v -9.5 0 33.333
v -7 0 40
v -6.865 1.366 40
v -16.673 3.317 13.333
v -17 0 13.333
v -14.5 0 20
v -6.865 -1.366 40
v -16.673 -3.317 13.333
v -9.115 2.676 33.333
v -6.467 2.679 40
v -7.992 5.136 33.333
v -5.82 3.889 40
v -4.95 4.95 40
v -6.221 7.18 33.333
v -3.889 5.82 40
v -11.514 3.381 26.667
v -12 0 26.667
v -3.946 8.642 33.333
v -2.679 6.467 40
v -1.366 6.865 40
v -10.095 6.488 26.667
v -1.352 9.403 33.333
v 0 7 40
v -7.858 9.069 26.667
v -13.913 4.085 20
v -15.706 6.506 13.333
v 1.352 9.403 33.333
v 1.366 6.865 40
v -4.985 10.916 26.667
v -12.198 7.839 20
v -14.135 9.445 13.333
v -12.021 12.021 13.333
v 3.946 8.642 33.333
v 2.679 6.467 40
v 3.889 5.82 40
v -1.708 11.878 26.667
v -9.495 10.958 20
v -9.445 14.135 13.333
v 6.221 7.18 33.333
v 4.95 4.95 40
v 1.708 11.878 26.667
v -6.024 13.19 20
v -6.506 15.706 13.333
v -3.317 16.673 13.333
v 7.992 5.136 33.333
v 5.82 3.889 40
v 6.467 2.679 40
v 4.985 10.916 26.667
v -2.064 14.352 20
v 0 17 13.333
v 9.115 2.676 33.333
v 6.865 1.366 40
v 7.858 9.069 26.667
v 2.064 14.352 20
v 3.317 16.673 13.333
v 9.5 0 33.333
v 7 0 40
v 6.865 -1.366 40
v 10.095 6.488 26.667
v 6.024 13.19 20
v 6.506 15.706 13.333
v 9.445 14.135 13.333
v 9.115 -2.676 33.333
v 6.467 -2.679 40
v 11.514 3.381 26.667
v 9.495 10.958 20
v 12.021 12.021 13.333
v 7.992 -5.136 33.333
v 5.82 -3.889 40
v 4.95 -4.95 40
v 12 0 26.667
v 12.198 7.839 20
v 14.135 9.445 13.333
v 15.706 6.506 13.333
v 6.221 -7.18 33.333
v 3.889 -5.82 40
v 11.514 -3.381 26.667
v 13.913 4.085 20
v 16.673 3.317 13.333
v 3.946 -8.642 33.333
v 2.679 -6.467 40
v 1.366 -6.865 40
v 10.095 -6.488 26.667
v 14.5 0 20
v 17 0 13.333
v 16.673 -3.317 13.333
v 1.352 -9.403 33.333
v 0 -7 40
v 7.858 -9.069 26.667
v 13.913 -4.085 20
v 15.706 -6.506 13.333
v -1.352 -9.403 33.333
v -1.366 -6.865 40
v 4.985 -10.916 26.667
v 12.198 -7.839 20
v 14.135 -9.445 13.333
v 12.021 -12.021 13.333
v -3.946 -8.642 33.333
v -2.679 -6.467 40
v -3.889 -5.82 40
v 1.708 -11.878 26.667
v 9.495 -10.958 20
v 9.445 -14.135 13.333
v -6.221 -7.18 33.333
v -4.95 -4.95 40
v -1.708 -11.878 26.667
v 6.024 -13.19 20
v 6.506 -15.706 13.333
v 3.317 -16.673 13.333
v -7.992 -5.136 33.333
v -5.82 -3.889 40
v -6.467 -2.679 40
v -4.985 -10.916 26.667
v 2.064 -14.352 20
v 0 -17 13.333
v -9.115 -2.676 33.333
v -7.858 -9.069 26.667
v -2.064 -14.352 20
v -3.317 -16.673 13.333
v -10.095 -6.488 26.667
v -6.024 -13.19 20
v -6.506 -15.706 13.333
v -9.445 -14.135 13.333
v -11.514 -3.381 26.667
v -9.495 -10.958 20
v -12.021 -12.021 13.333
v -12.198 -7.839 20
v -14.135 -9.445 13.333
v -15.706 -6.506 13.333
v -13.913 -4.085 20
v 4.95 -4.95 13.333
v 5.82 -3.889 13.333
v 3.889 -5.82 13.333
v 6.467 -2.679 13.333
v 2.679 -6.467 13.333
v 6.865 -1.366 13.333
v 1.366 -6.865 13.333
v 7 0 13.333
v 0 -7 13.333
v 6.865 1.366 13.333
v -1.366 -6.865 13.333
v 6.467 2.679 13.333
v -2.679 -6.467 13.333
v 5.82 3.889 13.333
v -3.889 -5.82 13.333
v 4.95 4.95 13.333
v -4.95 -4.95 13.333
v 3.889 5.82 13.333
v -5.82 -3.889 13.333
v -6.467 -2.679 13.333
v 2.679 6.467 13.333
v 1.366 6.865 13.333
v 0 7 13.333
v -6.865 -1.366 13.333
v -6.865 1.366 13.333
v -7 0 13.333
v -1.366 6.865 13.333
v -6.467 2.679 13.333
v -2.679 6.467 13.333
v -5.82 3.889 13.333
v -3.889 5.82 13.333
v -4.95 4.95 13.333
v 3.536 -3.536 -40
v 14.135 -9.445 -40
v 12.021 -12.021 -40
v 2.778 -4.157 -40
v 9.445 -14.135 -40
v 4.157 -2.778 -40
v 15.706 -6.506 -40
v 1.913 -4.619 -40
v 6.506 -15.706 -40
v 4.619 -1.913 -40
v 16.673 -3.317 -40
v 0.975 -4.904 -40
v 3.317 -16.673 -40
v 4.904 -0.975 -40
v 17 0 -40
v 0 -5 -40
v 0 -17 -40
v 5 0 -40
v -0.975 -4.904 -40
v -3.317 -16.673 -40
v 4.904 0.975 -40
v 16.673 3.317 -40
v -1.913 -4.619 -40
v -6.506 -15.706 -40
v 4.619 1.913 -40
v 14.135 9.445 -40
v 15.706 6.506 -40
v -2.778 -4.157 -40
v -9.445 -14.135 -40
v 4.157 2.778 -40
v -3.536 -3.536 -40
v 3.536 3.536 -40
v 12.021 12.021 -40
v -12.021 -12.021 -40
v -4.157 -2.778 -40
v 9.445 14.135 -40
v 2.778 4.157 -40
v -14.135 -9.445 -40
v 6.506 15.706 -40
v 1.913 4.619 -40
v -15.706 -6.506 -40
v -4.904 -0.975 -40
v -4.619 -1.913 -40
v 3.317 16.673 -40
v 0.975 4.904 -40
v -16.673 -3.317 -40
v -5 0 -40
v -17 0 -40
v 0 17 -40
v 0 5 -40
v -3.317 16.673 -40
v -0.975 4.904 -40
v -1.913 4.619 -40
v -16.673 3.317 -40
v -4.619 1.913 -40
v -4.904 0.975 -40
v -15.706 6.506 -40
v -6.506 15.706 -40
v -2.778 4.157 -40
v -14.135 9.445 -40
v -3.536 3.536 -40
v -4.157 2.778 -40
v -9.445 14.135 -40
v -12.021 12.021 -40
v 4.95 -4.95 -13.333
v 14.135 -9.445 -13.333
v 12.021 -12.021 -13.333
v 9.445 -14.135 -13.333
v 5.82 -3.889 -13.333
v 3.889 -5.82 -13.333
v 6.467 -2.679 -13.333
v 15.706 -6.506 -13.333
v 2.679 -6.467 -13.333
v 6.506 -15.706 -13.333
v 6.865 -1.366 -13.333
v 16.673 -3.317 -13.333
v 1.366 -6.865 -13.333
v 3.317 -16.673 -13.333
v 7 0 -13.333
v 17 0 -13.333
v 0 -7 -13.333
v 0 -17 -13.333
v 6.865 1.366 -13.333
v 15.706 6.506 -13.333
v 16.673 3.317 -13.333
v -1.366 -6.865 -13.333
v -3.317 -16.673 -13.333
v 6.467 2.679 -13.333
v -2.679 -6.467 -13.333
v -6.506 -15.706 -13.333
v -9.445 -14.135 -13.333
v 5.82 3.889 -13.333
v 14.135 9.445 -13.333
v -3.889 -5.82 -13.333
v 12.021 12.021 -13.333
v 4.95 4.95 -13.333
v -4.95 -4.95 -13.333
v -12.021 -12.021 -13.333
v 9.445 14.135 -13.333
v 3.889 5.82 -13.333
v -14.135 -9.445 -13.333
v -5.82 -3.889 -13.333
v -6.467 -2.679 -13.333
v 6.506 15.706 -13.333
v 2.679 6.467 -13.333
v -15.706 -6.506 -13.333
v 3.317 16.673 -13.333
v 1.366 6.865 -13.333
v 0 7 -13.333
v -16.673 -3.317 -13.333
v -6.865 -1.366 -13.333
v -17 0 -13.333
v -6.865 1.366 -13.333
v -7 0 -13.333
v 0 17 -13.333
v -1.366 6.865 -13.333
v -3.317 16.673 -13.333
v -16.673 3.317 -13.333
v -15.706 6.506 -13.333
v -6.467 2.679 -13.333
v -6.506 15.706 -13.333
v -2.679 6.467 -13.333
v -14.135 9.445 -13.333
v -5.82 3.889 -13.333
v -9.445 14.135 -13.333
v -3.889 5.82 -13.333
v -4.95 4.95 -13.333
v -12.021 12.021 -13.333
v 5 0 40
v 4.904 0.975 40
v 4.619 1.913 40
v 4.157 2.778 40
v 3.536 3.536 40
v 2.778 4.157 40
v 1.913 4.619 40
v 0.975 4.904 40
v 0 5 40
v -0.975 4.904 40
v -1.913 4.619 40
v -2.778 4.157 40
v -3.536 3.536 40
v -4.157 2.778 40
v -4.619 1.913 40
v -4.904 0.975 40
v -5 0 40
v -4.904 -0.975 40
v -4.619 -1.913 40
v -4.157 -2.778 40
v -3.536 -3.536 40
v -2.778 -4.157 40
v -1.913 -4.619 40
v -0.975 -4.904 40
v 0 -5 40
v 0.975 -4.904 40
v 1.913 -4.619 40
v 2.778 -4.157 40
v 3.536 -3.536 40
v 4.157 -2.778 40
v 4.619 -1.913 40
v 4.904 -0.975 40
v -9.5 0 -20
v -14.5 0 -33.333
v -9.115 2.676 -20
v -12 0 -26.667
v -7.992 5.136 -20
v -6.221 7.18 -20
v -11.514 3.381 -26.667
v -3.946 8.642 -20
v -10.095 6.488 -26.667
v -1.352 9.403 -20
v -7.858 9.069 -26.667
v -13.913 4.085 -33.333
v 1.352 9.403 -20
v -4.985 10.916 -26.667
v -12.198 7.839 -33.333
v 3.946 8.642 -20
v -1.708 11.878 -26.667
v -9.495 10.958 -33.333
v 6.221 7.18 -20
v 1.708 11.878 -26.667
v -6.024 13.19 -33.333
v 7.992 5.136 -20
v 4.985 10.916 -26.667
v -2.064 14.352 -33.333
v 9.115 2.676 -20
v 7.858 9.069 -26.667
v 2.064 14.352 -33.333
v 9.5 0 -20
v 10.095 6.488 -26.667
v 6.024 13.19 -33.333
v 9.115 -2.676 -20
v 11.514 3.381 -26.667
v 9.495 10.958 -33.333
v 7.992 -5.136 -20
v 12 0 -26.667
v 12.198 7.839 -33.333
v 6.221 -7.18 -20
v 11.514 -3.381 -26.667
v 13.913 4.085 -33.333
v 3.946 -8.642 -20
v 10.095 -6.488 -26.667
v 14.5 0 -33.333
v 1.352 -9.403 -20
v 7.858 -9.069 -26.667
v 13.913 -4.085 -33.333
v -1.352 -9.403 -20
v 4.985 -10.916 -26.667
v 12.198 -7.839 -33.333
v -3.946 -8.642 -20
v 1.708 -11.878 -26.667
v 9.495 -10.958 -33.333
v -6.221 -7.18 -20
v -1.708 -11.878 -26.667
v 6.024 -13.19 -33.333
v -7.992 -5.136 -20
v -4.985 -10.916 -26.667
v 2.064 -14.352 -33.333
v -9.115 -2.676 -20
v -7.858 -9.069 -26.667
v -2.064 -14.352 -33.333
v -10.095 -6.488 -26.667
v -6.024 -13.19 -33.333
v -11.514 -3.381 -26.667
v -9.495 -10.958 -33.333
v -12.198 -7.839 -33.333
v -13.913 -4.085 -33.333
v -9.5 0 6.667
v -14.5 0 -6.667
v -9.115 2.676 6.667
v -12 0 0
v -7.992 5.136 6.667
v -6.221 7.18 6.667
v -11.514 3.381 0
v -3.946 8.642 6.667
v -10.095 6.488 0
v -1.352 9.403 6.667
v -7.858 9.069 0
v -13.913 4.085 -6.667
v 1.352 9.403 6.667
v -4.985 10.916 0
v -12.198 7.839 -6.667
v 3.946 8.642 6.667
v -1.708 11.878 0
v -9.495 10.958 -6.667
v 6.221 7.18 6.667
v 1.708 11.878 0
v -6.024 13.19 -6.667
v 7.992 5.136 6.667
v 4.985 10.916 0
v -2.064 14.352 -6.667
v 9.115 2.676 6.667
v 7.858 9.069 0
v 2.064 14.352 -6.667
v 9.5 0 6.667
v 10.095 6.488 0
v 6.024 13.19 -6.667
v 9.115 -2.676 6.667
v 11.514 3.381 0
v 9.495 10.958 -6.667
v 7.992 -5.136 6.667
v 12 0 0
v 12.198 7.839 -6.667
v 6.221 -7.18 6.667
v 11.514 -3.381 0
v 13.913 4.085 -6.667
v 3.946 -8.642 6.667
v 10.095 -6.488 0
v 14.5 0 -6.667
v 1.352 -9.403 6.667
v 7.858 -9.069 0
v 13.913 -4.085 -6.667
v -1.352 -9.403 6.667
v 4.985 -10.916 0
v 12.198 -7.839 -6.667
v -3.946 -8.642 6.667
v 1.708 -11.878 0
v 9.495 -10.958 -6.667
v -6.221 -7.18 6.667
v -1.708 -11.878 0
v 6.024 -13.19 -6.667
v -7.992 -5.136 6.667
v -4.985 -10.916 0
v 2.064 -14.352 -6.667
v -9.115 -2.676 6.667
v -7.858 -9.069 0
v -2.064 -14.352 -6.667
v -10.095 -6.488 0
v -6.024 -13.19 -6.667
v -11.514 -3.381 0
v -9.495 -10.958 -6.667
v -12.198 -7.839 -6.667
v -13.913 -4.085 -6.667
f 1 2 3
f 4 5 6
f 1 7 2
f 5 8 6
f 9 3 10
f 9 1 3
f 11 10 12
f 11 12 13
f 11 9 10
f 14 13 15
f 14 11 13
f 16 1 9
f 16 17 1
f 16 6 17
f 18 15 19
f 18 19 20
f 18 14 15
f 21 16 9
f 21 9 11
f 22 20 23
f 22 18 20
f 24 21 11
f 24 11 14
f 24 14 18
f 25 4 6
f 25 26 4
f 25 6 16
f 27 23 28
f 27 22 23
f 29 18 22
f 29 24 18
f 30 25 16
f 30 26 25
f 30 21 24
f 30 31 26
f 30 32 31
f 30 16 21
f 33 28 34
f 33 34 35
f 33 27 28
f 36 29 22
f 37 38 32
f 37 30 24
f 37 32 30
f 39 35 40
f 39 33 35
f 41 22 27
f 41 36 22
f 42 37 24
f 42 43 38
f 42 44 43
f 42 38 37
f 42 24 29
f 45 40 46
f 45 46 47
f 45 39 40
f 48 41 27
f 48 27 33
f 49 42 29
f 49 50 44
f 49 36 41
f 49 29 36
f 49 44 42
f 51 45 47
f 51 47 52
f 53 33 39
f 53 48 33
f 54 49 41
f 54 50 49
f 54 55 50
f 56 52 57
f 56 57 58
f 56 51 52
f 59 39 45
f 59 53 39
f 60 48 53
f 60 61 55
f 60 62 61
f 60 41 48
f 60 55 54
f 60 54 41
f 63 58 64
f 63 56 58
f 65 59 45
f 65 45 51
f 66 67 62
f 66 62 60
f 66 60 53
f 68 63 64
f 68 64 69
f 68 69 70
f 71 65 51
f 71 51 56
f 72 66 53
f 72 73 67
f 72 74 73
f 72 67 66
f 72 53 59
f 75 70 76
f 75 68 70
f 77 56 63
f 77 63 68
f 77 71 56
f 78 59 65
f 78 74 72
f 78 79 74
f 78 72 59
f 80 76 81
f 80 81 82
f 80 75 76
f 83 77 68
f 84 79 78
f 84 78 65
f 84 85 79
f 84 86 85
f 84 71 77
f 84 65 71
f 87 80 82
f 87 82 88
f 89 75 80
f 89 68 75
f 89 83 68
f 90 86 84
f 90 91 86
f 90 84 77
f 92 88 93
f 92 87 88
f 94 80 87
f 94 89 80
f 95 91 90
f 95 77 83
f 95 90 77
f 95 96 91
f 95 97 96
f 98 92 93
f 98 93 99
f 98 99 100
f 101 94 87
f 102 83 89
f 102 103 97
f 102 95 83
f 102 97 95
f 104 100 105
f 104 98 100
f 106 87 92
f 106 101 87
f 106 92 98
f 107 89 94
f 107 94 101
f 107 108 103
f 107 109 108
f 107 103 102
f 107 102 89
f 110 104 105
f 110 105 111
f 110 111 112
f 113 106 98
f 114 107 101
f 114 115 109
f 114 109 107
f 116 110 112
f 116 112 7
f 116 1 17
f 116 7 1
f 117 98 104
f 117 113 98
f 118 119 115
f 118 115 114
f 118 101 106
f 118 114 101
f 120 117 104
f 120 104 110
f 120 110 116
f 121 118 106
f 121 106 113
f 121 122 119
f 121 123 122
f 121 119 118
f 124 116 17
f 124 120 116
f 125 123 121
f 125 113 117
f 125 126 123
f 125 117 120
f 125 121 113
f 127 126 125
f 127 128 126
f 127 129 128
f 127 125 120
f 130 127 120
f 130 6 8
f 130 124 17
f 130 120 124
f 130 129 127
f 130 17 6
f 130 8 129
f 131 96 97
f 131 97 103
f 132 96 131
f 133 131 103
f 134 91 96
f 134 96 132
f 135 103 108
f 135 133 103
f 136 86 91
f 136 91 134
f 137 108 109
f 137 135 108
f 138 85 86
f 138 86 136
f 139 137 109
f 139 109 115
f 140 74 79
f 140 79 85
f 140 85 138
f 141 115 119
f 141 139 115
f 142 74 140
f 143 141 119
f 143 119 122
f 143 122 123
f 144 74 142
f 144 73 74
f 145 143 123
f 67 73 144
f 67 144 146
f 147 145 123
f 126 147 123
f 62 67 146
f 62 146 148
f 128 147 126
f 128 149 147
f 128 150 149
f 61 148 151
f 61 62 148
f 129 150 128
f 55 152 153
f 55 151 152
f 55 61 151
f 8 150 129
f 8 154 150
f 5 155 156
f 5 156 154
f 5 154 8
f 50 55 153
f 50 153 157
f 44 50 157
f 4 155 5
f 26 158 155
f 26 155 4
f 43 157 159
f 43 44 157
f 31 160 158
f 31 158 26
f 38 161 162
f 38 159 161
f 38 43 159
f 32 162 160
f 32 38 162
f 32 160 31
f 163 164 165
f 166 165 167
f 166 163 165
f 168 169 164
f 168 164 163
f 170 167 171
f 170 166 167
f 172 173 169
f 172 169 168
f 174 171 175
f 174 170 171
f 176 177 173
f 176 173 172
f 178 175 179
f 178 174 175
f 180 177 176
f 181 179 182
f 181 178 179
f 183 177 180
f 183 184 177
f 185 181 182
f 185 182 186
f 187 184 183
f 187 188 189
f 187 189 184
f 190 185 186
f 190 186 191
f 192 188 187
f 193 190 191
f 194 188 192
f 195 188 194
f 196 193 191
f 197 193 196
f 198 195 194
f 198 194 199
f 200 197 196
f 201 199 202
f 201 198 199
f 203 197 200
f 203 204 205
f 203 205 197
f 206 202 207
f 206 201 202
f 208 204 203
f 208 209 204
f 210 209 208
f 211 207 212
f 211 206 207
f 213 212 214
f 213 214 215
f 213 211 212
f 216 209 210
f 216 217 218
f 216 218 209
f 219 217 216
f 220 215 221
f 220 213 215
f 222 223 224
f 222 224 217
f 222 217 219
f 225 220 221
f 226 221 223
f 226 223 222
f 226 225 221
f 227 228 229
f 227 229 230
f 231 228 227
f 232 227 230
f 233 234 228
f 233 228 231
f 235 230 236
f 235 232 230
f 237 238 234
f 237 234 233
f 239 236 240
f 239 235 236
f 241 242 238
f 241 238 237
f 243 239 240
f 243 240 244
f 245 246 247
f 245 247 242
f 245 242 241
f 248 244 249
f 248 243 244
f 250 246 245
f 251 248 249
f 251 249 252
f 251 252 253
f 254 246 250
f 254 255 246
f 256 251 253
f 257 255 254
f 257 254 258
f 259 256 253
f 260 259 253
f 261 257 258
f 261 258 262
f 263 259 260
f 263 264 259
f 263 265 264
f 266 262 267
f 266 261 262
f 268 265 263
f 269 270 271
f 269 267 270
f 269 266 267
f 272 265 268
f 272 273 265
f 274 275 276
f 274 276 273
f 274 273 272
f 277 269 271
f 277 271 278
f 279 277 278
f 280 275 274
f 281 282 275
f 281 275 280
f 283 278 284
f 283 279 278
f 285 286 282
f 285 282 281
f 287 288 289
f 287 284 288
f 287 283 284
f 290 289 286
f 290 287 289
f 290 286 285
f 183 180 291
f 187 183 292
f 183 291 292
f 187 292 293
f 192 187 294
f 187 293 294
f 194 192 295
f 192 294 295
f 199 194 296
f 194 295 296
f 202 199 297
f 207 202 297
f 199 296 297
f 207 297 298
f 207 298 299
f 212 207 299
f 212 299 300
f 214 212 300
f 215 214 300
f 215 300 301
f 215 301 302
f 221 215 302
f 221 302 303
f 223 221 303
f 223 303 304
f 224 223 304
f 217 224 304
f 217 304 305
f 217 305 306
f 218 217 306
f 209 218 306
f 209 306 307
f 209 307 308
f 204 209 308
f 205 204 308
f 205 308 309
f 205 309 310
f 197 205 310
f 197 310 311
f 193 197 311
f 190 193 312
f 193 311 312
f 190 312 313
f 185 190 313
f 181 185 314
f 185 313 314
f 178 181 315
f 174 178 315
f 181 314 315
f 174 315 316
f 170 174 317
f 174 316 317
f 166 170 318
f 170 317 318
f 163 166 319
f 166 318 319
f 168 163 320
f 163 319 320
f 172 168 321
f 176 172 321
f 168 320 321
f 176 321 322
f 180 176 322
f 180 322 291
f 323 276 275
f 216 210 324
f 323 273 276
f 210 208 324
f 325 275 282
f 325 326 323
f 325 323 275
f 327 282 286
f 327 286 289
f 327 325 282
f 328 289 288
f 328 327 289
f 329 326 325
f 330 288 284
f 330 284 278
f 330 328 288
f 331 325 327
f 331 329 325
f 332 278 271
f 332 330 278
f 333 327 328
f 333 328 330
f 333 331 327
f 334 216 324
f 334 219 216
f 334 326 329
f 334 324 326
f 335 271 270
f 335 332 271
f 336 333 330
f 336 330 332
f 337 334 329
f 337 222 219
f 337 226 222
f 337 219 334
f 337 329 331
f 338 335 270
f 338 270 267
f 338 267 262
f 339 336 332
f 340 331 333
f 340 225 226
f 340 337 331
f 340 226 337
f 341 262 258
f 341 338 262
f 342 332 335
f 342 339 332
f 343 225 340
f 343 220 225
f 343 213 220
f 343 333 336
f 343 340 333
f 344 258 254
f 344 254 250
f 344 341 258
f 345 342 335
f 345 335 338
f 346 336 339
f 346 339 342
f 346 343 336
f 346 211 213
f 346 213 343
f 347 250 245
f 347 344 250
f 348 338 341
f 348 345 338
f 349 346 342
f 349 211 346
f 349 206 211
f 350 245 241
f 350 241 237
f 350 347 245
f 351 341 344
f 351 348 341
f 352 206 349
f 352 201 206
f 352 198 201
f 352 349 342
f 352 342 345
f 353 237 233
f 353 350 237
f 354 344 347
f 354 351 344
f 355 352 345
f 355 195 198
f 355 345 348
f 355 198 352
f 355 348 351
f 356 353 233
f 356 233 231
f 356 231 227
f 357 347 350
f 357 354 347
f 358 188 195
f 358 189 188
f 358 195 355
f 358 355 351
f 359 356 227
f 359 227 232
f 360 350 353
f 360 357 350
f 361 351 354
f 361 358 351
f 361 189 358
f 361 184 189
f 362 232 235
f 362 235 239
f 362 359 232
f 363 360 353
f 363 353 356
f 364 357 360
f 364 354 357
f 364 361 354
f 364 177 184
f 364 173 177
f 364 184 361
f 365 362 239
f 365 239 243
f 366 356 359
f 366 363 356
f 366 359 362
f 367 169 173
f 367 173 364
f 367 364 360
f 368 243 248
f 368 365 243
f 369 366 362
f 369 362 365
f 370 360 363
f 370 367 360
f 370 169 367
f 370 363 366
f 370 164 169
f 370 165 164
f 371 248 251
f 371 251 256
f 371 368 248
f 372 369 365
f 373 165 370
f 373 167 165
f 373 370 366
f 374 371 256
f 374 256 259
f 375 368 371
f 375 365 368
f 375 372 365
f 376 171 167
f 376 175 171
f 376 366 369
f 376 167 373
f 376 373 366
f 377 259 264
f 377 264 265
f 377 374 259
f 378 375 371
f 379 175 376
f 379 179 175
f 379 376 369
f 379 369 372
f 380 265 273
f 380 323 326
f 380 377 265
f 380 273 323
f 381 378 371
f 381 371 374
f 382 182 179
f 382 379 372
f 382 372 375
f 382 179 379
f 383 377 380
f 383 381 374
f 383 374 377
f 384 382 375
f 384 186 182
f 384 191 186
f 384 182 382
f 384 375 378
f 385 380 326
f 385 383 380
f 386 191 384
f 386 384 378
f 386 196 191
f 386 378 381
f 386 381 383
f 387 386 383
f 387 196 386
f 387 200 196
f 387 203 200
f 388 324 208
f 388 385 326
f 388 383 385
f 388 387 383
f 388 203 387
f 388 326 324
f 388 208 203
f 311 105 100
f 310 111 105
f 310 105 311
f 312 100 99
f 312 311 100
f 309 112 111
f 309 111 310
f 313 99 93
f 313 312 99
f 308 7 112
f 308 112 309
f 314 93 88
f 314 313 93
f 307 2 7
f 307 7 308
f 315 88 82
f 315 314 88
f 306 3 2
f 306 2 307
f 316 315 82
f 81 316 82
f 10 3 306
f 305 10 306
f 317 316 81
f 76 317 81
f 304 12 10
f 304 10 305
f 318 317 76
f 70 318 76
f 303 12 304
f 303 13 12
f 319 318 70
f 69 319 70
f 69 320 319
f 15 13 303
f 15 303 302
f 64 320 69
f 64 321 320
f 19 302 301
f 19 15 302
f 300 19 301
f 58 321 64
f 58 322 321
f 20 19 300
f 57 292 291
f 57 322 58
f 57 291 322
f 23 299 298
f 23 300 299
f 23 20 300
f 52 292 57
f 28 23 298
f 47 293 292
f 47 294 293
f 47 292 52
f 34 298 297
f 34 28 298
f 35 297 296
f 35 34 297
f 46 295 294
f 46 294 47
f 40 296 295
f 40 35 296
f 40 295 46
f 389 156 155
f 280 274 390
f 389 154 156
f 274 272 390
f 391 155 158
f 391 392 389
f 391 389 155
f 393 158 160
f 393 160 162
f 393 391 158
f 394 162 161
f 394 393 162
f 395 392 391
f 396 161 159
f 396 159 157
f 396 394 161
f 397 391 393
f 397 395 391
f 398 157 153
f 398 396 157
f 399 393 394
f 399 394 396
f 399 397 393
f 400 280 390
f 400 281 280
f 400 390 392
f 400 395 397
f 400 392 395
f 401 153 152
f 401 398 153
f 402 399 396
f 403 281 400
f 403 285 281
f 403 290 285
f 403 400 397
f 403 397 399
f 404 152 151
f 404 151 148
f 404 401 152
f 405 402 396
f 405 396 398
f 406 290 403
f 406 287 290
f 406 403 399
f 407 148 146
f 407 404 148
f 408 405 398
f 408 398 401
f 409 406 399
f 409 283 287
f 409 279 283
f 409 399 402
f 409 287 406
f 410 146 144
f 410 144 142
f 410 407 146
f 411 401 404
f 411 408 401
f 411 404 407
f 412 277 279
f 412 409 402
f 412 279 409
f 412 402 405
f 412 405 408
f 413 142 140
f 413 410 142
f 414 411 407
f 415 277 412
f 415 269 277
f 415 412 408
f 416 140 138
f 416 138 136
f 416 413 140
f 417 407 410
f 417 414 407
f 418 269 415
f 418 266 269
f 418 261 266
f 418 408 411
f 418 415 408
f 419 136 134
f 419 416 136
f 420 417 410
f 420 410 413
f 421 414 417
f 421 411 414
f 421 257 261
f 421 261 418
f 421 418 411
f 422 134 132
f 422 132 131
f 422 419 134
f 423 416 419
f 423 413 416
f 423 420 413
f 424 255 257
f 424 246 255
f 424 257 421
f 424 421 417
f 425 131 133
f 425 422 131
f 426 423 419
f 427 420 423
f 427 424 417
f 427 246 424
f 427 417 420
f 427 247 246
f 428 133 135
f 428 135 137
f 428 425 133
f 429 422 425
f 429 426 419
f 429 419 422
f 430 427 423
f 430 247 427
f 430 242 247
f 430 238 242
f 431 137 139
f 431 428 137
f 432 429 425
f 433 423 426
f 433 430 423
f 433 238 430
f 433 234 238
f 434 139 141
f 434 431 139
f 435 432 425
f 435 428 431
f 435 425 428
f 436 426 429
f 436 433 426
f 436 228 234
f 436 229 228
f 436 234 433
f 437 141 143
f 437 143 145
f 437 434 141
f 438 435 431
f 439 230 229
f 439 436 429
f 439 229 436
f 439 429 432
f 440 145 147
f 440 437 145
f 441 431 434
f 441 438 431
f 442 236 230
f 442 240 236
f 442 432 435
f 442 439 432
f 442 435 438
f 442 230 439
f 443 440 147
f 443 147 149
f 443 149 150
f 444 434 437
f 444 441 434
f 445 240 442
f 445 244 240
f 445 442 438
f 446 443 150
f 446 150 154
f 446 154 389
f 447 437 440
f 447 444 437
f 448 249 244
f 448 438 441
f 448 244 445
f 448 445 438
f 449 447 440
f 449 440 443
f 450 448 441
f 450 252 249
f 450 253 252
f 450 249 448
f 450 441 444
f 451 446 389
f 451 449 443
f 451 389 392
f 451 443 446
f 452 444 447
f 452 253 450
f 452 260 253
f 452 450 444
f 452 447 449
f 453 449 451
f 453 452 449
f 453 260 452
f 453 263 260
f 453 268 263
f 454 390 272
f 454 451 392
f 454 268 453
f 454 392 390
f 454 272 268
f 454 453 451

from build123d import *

# Parameters (mm, degrees)
F2_R     = 5
F3_DEPTH = 80.001


with BuildPart() as f1:
    # F0 (on Front) → F1 (revolve)
    with BuildSketch(Plane.XZ):
        Polygon((0, 40), (-7, 40), (-17, 13.333333), (-7, 13.333333), (-17, -13.333333), (-7, -13.333333), (-17, -40), (-7, -40), (0, -40), align=None)
    revolve(axis=Axis((0, 0, 0), (0, 0, -1)))

    # F2 (on face) → F3 (cut, through all)
    with BuildSketch(Plane.XY.offset(40)):
        Circle(F2_R)
    extrude(amount=-F3_DEPTH, mode=Mode.SUBTRACT)


solid = f1.part
